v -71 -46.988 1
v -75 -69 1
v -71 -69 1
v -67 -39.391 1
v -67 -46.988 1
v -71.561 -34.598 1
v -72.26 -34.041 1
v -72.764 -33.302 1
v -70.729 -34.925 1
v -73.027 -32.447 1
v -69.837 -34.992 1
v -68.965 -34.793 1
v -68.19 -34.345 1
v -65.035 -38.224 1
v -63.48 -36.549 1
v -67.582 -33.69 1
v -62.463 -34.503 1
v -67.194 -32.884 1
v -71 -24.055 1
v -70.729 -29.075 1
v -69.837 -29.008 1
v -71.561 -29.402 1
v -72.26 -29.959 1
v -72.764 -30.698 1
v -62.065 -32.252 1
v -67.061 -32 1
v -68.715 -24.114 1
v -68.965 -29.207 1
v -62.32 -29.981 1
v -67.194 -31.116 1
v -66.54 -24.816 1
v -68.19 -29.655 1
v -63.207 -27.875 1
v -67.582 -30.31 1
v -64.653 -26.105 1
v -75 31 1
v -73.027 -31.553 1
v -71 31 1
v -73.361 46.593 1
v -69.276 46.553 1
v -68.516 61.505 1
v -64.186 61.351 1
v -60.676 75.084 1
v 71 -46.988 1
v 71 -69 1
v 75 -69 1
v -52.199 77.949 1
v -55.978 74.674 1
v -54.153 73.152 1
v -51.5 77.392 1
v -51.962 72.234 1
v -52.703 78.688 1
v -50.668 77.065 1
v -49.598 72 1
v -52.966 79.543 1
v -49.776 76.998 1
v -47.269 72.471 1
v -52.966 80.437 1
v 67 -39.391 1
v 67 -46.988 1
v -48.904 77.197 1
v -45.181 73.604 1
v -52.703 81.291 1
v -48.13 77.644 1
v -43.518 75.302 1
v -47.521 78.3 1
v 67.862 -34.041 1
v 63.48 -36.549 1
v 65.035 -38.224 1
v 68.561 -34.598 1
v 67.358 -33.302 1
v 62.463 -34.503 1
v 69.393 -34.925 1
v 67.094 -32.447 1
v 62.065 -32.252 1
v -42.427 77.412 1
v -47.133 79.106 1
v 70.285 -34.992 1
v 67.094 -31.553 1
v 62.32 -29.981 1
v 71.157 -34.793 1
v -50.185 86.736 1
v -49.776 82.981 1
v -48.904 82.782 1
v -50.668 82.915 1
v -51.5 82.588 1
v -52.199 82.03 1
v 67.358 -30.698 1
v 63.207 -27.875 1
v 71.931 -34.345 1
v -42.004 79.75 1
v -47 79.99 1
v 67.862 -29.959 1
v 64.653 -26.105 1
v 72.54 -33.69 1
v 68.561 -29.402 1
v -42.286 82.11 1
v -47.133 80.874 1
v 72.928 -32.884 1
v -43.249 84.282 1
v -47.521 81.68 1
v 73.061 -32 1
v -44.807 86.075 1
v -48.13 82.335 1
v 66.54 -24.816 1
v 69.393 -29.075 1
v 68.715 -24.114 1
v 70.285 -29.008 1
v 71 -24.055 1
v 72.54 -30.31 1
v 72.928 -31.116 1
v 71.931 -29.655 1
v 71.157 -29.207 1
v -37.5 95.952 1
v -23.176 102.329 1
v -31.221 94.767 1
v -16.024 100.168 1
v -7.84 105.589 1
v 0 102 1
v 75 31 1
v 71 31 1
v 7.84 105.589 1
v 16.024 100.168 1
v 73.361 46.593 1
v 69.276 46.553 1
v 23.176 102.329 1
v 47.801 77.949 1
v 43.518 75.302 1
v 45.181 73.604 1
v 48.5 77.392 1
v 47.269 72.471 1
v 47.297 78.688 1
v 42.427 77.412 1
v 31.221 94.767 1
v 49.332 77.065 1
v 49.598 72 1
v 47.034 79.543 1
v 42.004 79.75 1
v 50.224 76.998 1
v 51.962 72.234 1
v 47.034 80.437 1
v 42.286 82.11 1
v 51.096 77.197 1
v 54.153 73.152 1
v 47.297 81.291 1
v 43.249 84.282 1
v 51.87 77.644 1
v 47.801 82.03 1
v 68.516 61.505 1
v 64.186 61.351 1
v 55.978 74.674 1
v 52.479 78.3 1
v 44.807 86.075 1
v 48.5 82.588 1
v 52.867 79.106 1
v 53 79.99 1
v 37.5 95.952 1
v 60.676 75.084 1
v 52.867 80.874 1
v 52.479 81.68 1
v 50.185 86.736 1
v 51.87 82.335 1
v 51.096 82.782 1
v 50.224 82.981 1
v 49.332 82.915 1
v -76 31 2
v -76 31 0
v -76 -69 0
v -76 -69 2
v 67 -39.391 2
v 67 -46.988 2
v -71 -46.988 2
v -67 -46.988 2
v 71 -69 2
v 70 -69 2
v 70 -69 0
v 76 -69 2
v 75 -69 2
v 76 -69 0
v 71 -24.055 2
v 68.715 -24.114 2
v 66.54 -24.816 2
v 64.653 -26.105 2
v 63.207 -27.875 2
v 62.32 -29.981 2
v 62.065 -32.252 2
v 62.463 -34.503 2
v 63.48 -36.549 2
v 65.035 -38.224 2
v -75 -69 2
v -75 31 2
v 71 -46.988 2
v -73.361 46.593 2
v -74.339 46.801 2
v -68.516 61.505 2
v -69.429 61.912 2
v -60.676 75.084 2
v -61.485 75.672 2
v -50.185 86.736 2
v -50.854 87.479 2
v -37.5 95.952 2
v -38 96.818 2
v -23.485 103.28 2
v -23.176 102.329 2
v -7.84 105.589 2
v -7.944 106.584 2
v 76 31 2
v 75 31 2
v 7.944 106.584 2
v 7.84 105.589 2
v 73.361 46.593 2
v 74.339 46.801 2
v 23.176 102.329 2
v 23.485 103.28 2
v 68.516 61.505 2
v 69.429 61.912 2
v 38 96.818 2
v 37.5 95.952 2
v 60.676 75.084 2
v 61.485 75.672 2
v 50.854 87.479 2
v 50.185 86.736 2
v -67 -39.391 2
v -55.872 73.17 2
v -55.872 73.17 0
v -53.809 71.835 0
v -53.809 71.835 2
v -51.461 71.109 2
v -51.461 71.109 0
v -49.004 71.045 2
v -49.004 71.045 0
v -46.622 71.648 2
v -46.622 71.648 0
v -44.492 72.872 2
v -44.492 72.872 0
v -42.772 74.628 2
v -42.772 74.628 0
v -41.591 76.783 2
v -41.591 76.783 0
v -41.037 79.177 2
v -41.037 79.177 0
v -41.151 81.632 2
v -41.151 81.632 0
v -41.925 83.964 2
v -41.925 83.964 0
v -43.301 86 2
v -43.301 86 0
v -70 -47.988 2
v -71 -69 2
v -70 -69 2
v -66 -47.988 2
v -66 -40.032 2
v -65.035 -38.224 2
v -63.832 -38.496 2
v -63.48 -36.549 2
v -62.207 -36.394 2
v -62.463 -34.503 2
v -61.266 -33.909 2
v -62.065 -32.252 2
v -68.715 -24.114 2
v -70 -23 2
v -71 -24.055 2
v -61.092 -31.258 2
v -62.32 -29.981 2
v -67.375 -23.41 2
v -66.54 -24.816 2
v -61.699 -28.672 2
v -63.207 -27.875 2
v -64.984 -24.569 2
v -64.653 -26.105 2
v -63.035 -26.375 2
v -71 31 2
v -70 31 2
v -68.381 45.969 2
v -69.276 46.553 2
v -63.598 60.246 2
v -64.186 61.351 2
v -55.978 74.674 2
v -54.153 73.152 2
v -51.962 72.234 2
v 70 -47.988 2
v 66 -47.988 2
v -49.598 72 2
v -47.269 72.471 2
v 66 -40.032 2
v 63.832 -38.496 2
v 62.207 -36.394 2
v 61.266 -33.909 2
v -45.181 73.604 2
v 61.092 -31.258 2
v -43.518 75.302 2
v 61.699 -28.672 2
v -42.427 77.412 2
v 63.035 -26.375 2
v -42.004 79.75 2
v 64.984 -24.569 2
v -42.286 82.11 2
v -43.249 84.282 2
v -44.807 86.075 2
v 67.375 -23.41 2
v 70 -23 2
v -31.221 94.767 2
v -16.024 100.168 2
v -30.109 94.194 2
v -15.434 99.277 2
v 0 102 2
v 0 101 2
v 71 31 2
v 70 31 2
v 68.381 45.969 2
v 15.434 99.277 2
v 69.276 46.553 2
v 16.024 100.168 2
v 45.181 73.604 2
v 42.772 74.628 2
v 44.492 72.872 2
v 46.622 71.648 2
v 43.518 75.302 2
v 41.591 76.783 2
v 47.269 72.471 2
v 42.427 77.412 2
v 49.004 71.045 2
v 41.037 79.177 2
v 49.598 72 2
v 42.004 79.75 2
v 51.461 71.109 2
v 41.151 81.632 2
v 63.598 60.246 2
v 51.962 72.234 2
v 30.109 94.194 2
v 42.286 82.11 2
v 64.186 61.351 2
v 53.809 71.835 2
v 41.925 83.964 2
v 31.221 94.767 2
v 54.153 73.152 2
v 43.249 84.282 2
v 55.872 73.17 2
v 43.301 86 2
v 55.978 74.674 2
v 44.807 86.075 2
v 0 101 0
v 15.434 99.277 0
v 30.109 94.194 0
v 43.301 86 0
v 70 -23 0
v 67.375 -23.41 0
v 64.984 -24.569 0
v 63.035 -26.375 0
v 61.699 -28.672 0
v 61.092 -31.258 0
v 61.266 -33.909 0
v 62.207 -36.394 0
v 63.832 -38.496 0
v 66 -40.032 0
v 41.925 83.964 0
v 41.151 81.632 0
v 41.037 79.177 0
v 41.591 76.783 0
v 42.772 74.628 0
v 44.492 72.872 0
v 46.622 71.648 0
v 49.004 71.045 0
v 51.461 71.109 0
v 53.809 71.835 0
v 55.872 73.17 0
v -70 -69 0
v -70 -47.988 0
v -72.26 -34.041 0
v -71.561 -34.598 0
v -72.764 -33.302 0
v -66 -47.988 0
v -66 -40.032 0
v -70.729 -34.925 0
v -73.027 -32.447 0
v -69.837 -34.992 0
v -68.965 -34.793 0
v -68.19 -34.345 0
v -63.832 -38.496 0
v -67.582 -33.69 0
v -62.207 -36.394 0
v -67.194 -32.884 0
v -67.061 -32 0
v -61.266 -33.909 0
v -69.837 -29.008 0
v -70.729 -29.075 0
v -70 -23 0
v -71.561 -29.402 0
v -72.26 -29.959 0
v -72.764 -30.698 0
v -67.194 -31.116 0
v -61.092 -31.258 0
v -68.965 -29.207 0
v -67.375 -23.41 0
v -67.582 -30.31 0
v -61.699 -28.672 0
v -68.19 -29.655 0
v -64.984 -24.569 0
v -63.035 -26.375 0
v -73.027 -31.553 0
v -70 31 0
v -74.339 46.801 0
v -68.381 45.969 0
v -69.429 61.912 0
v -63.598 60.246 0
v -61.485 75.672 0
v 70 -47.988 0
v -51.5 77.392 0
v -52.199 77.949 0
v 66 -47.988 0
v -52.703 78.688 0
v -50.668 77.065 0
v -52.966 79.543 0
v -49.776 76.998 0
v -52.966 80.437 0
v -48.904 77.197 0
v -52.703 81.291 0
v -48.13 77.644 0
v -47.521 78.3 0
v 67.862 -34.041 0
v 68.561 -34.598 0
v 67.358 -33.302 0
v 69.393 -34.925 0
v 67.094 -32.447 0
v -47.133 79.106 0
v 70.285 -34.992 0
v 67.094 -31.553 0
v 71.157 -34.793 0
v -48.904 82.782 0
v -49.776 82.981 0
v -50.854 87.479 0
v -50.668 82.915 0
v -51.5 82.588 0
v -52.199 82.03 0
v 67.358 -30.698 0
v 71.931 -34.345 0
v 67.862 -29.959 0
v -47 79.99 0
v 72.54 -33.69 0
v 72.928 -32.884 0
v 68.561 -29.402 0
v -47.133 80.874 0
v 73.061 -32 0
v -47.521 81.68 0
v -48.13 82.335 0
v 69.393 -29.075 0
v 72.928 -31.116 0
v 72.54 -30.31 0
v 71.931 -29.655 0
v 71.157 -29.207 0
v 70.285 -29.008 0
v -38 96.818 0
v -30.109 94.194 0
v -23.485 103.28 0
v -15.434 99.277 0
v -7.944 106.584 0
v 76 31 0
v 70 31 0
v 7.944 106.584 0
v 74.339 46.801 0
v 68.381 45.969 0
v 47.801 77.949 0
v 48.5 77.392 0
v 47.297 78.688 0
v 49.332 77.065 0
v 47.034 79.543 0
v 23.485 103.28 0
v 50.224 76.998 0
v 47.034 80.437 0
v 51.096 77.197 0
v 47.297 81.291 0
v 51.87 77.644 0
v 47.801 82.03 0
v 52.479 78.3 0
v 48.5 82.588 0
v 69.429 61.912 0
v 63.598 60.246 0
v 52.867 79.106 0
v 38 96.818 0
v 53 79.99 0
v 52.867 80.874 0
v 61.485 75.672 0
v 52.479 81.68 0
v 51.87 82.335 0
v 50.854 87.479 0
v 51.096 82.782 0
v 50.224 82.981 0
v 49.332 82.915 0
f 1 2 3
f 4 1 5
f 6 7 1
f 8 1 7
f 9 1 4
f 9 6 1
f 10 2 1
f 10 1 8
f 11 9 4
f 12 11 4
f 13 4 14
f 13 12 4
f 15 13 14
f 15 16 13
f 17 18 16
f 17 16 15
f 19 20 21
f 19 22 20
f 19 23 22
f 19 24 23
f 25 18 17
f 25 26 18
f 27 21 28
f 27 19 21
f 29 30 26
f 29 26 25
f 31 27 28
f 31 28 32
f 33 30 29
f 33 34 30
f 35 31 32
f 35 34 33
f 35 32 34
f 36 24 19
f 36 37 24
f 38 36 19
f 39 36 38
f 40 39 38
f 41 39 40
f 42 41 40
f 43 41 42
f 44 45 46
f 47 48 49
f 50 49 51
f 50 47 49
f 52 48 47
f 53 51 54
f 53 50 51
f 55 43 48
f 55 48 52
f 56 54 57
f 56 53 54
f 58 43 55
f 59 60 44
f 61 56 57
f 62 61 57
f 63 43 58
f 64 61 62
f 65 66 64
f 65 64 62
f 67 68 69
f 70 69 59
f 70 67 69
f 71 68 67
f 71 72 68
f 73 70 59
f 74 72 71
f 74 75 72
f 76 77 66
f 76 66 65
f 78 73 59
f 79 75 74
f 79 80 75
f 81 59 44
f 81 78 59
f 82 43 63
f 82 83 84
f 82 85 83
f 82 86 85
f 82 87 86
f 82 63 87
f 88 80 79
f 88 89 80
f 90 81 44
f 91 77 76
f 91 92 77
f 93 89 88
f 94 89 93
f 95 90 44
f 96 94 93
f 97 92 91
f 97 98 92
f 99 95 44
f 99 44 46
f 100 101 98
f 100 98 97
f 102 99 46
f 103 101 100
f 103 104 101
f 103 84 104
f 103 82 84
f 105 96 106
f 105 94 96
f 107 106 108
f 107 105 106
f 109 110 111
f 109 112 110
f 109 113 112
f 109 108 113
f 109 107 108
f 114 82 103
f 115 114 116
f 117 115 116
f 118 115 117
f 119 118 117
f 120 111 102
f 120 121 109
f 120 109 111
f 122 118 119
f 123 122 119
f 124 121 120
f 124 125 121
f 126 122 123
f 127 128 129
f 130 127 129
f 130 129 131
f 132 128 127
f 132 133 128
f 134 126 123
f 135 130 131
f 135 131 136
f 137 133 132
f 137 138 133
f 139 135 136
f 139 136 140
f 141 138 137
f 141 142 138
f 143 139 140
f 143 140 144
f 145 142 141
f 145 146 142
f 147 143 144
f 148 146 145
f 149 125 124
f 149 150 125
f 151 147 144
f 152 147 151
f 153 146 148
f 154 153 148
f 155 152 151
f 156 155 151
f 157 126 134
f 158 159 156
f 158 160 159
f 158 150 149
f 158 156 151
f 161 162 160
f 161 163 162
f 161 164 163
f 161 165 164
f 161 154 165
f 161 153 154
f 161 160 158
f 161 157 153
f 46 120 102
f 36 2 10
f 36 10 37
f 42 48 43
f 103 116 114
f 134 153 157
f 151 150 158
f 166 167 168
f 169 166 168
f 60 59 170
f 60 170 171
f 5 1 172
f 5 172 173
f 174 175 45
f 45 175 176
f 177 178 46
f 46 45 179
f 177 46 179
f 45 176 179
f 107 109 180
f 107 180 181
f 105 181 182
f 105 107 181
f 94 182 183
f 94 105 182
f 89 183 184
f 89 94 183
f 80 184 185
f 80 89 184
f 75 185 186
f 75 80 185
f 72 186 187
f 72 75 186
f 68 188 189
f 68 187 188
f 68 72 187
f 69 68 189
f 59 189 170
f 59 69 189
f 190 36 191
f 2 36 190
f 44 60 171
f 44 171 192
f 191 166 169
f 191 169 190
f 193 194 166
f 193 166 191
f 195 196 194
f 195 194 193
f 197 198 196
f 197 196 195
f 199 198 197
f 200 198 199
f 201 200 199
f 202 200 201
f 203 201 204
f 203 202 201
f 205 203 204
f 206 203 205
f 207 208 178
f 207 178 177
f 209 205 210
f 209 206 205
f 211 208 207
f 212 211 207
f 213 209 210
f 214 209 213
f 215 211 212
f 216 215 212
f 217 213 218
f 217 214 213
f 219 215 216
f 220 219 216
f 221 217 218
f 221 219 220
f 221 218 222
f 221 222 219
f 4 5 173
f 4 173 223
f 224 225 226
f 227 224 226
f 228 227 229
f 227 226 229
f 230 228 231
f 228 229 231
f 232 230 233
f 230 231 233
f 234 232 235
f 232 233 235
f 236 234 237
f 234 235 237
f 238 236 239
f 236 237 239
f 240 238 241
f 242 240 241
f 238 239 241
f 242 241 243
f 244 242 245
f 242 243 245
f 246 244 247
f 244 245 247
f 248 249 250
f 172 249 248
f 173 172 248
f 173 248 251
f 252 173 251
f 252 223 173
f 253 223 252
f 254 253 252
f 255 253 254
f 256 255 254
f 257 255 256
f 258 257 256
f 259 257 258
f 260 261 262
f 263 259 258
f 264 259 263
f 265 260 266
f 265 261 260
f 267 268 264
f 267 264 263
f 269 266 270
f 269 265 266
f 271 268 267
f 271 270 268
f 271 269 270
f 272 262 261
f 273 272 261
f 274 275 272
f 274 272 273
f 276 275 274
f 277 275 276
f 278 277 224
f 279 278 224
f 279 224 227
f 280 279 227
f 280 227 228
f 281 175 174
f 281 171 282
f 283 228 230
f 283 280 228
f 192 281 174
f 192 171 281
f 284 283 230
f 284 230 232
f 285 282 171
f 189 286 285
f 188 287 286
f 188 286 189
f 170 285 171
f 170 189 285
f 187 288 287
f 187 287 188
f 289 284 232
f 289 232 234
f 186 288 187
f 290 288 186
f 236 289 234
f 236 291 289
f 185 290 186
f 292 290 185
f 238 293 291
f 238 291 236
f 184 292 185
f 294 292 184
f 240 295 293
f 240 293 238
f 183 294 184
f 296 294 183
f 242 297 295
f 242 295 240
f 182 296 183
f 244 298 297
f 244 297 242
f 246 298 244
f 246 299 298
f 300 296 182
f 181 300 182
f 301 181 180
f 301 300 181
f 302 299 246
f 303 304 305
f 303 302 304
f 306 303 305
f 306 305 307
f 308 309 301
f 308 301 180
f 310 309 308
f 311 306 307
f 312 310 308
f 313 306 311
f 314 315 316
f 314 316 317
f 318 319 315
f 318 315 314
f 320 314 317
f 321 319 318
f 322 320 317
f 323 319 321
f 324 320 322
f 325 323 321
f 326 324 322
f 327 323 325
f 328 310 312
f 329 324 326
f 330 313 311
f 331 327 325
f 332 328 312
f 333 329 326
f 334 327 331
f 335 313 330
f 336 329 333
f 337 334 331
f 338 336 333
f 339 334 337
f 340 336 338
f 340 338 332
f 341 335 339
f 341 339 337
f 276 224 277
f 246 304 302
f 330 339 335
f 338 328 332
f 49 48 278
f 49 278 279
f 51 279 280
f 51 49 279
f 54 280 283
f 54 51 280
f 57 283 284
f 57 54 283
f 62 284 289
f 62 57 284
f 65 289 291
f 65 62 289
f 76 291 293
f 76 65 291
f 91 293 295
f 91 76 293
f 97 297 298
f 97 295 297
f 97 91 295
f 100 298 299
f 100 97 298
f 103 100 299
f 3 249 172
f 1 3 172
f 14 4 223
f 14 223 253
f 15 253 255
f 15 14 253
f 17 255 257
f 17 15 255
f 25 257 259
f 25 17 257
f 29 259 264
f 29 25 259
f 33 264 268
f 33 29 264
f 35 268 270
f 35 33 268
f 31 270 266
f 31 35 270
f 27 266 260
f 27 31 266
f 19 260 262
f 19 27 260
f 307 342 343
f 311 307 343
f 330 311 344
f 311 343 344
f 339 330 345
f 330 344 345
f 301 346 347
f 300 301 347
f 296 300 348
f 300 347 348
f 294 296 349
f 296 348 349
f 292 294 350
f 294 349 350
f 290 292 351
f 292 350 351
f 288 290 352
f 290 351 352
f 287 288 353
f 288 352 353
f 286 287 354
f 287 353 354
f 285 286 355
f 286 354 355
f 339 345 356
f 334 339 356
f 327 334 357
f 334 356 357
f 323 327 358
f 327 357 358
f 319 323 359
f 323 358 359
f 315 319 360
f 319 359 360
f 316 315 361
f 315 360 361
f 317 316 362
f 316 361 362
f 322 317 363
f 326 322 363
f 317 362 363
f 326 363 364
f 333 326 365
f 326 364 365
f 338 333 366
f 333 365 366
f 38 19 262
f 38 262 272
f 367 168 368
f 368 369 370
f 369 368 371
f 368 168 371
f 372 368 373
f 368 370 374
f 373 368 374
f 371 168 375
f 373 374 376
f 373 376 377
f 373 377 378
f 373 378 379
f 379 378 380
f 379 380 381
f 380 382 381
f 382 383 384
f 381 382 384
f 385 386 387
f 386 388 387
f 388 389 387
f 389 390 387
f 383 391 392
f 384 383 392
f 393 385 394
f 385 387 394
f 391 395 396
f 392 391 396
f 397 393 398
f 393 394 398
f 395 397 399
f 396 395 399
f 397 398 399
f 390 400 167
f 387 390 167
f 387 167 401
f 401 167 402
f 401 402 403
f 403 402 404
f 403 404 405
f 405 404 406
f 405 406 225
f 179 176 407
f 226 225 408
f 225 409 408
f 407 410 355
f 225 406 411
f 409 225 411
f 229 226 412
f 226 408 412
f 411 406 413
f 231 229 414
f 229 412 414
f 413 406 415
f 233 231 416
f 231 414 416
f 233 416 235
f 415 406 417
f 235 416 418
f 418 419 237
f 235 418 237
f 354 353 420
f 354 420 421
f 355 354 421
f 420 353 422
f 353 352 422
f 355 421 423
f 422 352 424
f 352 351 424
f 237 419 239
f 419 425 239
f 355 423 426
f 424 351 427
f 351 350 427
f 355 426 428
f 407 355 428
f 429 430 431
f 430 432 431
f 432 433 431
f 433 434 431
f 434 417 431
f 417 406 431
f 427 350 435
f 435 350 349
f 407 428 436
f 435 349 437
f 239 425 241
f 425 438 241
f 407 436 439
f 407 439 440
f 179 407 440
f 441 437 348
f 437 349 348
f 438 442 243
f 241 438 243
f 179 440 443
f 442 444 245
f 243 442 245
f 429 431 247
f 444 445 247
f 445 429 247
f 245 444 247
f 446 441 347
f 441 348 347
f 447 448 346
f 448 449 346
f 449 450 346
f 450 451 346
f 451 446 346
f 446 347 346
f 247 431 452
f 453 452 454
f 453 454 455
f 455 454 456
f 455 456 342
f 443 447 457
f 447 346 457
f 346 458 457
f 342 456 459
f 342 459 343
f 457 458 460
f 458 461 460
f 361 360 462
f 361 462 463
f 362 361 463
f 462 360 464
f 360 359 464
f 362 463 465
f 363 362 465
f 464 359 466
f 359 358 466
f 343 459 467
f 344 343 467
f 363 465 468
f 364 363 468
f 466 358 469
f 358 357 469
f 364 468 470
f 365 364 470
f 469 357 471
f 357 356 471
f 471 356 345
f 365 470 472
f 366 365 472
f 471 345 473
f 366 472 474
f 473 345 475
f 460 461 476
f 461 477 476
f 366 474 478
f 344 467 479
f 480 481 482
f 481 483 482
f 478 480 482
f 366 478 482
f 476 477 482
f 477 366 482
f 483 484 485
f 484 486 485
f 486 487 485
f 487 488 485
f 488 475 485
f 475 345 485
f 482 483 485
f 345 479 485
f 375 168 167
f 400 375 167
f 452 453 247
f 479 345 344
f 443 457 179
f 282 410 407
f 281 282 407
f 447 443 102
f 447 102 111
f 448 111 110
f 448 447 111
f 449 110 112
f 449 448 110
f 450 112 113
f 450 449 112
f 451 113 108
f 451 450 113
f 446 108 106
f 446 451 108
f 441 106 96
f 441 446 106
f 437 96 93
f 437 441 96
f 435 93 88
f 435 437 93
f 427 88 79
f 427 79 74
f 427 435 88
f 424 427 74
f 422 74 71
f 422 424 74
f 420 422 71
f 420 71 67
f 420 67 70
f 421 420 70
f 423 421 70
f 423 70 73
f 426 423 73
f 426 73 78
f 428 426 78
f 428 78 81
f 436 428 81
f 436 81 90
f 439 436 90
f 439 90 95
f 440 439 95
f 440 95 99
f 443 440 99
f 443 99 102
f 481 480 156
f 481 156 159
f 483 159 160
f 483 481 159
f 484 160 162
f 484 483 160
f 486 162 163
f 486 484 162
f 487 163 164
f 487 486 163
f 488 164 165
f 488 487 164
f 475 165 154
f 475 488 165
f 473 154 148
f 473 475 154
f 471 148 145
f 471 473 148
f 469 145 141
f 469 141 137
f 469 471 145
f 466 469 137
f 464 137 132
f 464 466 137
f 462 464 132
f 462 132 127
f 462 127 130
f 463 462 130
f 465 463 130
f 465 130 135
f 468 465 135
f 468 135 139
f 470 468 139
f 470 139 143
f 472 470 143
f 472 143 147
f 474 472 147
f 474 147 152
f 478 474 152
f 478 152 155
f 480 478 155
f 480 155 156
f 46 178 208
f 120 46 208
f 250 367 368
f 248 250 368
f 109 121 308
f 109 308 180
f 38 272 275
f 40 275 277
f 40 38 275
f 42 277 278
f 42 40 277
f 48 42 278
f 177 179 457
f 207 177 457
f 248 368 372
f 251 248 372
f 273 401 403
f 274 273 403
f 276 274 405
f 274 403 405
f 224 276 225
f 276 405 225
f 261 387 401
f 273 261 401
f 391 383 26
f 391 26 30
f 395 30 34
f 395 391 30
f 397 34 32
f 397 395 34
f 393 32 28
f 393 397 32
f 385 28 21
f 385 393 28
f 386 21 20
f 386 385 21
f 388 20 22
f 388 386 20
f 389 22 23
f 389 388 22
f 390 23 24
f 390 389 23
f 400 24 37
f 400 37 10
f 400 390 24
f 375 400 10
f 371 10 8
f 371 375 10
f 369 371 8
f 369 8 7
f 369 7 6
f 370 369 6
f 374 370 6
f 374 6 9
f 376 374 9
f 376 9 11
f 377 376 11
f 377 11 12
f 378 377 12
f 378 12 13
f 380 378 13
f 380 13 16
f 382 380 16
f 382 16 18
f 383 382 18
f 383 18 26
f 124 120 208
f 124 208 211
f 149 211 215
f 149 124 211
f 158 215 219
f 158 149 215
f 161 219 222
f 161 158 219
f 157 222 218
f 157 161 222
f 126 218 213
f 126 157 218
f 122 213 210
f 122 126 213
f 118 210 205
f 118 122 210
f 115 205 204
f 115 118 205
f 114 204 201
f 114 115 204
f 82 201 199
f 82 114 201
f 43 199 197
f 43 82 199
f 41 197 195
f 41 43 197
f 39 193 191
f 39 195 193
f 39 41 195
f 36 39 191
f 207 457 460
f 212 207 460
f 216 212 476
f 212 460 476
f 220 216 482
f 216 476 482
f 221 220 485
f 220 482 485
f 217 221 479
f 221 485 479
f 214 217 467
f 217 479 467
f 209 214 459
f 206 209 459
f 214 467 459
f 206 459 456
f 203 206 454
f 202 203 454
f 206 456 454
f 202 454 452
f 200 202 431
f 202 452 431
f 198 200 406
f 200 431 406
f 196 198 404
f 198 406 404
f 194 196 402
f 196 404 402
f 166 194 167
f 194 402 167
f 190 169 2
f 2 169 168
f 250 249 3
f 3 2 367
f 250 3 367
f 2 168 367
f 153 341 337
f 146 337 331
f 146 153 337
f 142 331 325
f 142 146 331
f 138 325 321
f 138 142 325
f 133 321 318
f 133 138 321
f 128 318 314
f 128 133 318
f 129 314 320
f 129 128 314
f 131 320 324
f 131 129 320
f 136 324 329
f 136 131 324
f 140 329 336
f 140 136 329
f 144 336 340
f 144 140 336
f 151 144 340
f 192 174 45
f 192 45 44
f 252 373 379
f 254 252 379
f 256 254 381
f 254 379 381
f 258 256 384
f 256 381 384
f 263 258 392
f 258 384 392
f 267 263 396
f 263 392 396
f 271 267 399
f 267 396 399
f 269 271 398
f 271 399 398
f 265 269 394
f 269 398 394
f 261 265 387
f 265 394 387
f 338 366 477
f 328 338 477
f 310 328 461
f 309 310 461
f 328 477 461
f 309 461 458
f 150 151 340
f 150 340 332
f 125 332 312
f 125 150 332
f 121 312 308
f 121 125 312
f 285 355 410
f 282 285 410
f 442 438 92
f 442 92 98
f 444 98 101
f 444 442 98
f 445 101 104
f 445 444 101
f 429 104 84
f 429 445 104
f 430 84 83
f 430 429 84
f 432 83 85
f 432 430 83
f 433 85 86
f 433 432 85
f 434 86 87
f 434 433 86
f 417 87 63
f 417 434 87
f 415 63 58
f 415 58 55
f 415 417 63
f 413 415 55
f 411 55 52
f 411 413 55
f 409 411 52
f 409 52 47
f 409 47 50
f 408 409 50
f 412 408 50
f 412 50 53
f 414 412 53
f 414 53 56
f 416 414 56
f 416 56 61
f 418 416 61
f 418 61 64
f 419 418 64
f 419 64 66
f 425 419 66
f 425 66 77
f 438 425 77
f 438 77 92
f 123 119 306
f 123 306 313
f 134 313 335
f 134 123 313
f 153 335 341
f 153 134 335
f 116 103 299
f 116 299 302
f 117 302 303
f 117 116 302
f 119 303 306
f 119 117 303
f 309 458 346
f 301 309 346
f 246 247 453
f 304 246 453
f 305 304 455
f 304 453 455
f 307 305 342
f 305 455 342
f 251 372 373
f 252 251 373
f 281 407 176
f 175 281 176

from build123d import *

# Parameters (mm, degrees)
F0_R     = 3
F1_DEPTH = 2
F2_T     = -1
F4_W     = 4
F4_H     = 1
F4_R     = 4
F4_R_2   = 3
F5_DEPTH = 1


# Not quite as in the source:
# - a feature of the source that left no trace in its solid (it failed there, or was rolled back) is left out


with BuildPart() as f1:
    # F0 (on Top) → F1 (new body)
    with BuildSketch(Plane.XY):
        with BuildLine():
            ThreePointArc((76, 31), (0, 107), (-76, 31))
            Line((-76, 31), (-76, -31))
            Line((-76, -31), (-76, -69))
            Line((-76, -69), (-70, -69))
            Line((-70, -69), (-70, -47.9877756238))
            Line((-70, -47.9877756238), (-66, -47.9877756238))
            Line((-66, -47.9877756238), (-66, -40.0317243588))
            ThreePointArc((-66, -40.0317243588), (-61.2993566139, -29.9422610746), (-70, -23.00020646))
            Line((-70, -23.00020646), (-70, 31))
            ThreePointArc((-70, 31), (-66.3741952073, 53.2365962005), (-55.8723939833, 73.1696050559))
            ThreePointArc((-55.8723939833, 73.1696050559), (-43.5714285714, 73.6911069456), (-43.3010754044, 86.0001533527))
            ThreePointArc((-43.3010754044, 86.0001533527), (-22.9127613494, 97.1438233499), (0, 101))
            ThreePointArc((0, 101), (22.9127613494, 97.1438233499), (43.3010754044, 86.0001533527))
            ThreePointArc((43.3010754044, 86.0001533527), (43.5714285714, 73.6911069456), (55.8723939833, 73.1696050559))
            ThreePointArc((55.8723939833, 73.1696050559), (66.3741952073, 53.2365962005), (70, 31))
            Line((70, 31), (70, -23.00020646))
            ThreePointArc((70, -23.00020646), (61.2993566139, -29.9422610746), (66, -40.0317243588))
            Line((66, -40.0317243588), (66, -47.9877756238))
            Line((66, -47.9877756238), (70, -47.9877756238))
            Line((70, -47.9877756238), (70, -69))
            Line((70, -69), (76, -69))
            Line((76, -69), (76, -31))
            Line((76, -31), (76, 31))
        make_face()
        with Locations((-70.0609609485, -32)):
            Circle(F0_R, mode=Mode.SUBTRACT)
        with Locations((70.0609609485, -32)):
            Circle(F0_R, mode=Mode.SUBTRACT)
        with Locations((-50, 79.9897948557)):
            Circle(F0_R, mode=Mode.SUBTRACT)
        with Locations((50, 79.9897948557)):
            Circle(F0_R, mode=Mode.SUBTRACT)
    extrude(amount=F1_DEPTH)

    # F2
    f2_openings = [f1.faces().sort_by_distance(p)[0] for p in [
        (0, 104.674489, 2),
    ]]
    offset(amount=F2_T, openings=f2_openings, kind=Kind.INTERSECTION)

    # F4 (on face) → F5 (cut)
    with BuildSketch(Plane.XY.offset(2)):
        with Locations((73, -68.5)):
            Rectangle(F4_W, F4_H)
        with Locations((-73, -68.5)):
            Rectangle(F4_W, F4_H)
        with Locations((-70.0609609485, -32)):
            Circle(F4_R)
        with Locations((-70.0609609485, -32)):
            Circle(F4_R_2, mode=Mode.SUBTRACT)
        with Locations((70.0609609485, -32)):
            Circle(F4_R)
        with Locations((70.0609609485, -32)):
            Circle(F4_R_2, mode=Mode.SUBTRACT)
        with Locations((-50, 79.9897948557)):
            Circle(F4_R)
        with Locations((-50, 79.9897948557)):
            Circle(F4_R_2, mode=Mode.SUBTRACT)
        with Locations((50, 79.9897948557)):
            Circle(F4_R)
        with Locations((50, 79.9897948557)):
            Circle(F4_R_2, mode=Mode.SUBTRACT)
    extrude(amount=-F5_DEPTH, mode=Mode.SUBTRACT)


solid = f1.part
